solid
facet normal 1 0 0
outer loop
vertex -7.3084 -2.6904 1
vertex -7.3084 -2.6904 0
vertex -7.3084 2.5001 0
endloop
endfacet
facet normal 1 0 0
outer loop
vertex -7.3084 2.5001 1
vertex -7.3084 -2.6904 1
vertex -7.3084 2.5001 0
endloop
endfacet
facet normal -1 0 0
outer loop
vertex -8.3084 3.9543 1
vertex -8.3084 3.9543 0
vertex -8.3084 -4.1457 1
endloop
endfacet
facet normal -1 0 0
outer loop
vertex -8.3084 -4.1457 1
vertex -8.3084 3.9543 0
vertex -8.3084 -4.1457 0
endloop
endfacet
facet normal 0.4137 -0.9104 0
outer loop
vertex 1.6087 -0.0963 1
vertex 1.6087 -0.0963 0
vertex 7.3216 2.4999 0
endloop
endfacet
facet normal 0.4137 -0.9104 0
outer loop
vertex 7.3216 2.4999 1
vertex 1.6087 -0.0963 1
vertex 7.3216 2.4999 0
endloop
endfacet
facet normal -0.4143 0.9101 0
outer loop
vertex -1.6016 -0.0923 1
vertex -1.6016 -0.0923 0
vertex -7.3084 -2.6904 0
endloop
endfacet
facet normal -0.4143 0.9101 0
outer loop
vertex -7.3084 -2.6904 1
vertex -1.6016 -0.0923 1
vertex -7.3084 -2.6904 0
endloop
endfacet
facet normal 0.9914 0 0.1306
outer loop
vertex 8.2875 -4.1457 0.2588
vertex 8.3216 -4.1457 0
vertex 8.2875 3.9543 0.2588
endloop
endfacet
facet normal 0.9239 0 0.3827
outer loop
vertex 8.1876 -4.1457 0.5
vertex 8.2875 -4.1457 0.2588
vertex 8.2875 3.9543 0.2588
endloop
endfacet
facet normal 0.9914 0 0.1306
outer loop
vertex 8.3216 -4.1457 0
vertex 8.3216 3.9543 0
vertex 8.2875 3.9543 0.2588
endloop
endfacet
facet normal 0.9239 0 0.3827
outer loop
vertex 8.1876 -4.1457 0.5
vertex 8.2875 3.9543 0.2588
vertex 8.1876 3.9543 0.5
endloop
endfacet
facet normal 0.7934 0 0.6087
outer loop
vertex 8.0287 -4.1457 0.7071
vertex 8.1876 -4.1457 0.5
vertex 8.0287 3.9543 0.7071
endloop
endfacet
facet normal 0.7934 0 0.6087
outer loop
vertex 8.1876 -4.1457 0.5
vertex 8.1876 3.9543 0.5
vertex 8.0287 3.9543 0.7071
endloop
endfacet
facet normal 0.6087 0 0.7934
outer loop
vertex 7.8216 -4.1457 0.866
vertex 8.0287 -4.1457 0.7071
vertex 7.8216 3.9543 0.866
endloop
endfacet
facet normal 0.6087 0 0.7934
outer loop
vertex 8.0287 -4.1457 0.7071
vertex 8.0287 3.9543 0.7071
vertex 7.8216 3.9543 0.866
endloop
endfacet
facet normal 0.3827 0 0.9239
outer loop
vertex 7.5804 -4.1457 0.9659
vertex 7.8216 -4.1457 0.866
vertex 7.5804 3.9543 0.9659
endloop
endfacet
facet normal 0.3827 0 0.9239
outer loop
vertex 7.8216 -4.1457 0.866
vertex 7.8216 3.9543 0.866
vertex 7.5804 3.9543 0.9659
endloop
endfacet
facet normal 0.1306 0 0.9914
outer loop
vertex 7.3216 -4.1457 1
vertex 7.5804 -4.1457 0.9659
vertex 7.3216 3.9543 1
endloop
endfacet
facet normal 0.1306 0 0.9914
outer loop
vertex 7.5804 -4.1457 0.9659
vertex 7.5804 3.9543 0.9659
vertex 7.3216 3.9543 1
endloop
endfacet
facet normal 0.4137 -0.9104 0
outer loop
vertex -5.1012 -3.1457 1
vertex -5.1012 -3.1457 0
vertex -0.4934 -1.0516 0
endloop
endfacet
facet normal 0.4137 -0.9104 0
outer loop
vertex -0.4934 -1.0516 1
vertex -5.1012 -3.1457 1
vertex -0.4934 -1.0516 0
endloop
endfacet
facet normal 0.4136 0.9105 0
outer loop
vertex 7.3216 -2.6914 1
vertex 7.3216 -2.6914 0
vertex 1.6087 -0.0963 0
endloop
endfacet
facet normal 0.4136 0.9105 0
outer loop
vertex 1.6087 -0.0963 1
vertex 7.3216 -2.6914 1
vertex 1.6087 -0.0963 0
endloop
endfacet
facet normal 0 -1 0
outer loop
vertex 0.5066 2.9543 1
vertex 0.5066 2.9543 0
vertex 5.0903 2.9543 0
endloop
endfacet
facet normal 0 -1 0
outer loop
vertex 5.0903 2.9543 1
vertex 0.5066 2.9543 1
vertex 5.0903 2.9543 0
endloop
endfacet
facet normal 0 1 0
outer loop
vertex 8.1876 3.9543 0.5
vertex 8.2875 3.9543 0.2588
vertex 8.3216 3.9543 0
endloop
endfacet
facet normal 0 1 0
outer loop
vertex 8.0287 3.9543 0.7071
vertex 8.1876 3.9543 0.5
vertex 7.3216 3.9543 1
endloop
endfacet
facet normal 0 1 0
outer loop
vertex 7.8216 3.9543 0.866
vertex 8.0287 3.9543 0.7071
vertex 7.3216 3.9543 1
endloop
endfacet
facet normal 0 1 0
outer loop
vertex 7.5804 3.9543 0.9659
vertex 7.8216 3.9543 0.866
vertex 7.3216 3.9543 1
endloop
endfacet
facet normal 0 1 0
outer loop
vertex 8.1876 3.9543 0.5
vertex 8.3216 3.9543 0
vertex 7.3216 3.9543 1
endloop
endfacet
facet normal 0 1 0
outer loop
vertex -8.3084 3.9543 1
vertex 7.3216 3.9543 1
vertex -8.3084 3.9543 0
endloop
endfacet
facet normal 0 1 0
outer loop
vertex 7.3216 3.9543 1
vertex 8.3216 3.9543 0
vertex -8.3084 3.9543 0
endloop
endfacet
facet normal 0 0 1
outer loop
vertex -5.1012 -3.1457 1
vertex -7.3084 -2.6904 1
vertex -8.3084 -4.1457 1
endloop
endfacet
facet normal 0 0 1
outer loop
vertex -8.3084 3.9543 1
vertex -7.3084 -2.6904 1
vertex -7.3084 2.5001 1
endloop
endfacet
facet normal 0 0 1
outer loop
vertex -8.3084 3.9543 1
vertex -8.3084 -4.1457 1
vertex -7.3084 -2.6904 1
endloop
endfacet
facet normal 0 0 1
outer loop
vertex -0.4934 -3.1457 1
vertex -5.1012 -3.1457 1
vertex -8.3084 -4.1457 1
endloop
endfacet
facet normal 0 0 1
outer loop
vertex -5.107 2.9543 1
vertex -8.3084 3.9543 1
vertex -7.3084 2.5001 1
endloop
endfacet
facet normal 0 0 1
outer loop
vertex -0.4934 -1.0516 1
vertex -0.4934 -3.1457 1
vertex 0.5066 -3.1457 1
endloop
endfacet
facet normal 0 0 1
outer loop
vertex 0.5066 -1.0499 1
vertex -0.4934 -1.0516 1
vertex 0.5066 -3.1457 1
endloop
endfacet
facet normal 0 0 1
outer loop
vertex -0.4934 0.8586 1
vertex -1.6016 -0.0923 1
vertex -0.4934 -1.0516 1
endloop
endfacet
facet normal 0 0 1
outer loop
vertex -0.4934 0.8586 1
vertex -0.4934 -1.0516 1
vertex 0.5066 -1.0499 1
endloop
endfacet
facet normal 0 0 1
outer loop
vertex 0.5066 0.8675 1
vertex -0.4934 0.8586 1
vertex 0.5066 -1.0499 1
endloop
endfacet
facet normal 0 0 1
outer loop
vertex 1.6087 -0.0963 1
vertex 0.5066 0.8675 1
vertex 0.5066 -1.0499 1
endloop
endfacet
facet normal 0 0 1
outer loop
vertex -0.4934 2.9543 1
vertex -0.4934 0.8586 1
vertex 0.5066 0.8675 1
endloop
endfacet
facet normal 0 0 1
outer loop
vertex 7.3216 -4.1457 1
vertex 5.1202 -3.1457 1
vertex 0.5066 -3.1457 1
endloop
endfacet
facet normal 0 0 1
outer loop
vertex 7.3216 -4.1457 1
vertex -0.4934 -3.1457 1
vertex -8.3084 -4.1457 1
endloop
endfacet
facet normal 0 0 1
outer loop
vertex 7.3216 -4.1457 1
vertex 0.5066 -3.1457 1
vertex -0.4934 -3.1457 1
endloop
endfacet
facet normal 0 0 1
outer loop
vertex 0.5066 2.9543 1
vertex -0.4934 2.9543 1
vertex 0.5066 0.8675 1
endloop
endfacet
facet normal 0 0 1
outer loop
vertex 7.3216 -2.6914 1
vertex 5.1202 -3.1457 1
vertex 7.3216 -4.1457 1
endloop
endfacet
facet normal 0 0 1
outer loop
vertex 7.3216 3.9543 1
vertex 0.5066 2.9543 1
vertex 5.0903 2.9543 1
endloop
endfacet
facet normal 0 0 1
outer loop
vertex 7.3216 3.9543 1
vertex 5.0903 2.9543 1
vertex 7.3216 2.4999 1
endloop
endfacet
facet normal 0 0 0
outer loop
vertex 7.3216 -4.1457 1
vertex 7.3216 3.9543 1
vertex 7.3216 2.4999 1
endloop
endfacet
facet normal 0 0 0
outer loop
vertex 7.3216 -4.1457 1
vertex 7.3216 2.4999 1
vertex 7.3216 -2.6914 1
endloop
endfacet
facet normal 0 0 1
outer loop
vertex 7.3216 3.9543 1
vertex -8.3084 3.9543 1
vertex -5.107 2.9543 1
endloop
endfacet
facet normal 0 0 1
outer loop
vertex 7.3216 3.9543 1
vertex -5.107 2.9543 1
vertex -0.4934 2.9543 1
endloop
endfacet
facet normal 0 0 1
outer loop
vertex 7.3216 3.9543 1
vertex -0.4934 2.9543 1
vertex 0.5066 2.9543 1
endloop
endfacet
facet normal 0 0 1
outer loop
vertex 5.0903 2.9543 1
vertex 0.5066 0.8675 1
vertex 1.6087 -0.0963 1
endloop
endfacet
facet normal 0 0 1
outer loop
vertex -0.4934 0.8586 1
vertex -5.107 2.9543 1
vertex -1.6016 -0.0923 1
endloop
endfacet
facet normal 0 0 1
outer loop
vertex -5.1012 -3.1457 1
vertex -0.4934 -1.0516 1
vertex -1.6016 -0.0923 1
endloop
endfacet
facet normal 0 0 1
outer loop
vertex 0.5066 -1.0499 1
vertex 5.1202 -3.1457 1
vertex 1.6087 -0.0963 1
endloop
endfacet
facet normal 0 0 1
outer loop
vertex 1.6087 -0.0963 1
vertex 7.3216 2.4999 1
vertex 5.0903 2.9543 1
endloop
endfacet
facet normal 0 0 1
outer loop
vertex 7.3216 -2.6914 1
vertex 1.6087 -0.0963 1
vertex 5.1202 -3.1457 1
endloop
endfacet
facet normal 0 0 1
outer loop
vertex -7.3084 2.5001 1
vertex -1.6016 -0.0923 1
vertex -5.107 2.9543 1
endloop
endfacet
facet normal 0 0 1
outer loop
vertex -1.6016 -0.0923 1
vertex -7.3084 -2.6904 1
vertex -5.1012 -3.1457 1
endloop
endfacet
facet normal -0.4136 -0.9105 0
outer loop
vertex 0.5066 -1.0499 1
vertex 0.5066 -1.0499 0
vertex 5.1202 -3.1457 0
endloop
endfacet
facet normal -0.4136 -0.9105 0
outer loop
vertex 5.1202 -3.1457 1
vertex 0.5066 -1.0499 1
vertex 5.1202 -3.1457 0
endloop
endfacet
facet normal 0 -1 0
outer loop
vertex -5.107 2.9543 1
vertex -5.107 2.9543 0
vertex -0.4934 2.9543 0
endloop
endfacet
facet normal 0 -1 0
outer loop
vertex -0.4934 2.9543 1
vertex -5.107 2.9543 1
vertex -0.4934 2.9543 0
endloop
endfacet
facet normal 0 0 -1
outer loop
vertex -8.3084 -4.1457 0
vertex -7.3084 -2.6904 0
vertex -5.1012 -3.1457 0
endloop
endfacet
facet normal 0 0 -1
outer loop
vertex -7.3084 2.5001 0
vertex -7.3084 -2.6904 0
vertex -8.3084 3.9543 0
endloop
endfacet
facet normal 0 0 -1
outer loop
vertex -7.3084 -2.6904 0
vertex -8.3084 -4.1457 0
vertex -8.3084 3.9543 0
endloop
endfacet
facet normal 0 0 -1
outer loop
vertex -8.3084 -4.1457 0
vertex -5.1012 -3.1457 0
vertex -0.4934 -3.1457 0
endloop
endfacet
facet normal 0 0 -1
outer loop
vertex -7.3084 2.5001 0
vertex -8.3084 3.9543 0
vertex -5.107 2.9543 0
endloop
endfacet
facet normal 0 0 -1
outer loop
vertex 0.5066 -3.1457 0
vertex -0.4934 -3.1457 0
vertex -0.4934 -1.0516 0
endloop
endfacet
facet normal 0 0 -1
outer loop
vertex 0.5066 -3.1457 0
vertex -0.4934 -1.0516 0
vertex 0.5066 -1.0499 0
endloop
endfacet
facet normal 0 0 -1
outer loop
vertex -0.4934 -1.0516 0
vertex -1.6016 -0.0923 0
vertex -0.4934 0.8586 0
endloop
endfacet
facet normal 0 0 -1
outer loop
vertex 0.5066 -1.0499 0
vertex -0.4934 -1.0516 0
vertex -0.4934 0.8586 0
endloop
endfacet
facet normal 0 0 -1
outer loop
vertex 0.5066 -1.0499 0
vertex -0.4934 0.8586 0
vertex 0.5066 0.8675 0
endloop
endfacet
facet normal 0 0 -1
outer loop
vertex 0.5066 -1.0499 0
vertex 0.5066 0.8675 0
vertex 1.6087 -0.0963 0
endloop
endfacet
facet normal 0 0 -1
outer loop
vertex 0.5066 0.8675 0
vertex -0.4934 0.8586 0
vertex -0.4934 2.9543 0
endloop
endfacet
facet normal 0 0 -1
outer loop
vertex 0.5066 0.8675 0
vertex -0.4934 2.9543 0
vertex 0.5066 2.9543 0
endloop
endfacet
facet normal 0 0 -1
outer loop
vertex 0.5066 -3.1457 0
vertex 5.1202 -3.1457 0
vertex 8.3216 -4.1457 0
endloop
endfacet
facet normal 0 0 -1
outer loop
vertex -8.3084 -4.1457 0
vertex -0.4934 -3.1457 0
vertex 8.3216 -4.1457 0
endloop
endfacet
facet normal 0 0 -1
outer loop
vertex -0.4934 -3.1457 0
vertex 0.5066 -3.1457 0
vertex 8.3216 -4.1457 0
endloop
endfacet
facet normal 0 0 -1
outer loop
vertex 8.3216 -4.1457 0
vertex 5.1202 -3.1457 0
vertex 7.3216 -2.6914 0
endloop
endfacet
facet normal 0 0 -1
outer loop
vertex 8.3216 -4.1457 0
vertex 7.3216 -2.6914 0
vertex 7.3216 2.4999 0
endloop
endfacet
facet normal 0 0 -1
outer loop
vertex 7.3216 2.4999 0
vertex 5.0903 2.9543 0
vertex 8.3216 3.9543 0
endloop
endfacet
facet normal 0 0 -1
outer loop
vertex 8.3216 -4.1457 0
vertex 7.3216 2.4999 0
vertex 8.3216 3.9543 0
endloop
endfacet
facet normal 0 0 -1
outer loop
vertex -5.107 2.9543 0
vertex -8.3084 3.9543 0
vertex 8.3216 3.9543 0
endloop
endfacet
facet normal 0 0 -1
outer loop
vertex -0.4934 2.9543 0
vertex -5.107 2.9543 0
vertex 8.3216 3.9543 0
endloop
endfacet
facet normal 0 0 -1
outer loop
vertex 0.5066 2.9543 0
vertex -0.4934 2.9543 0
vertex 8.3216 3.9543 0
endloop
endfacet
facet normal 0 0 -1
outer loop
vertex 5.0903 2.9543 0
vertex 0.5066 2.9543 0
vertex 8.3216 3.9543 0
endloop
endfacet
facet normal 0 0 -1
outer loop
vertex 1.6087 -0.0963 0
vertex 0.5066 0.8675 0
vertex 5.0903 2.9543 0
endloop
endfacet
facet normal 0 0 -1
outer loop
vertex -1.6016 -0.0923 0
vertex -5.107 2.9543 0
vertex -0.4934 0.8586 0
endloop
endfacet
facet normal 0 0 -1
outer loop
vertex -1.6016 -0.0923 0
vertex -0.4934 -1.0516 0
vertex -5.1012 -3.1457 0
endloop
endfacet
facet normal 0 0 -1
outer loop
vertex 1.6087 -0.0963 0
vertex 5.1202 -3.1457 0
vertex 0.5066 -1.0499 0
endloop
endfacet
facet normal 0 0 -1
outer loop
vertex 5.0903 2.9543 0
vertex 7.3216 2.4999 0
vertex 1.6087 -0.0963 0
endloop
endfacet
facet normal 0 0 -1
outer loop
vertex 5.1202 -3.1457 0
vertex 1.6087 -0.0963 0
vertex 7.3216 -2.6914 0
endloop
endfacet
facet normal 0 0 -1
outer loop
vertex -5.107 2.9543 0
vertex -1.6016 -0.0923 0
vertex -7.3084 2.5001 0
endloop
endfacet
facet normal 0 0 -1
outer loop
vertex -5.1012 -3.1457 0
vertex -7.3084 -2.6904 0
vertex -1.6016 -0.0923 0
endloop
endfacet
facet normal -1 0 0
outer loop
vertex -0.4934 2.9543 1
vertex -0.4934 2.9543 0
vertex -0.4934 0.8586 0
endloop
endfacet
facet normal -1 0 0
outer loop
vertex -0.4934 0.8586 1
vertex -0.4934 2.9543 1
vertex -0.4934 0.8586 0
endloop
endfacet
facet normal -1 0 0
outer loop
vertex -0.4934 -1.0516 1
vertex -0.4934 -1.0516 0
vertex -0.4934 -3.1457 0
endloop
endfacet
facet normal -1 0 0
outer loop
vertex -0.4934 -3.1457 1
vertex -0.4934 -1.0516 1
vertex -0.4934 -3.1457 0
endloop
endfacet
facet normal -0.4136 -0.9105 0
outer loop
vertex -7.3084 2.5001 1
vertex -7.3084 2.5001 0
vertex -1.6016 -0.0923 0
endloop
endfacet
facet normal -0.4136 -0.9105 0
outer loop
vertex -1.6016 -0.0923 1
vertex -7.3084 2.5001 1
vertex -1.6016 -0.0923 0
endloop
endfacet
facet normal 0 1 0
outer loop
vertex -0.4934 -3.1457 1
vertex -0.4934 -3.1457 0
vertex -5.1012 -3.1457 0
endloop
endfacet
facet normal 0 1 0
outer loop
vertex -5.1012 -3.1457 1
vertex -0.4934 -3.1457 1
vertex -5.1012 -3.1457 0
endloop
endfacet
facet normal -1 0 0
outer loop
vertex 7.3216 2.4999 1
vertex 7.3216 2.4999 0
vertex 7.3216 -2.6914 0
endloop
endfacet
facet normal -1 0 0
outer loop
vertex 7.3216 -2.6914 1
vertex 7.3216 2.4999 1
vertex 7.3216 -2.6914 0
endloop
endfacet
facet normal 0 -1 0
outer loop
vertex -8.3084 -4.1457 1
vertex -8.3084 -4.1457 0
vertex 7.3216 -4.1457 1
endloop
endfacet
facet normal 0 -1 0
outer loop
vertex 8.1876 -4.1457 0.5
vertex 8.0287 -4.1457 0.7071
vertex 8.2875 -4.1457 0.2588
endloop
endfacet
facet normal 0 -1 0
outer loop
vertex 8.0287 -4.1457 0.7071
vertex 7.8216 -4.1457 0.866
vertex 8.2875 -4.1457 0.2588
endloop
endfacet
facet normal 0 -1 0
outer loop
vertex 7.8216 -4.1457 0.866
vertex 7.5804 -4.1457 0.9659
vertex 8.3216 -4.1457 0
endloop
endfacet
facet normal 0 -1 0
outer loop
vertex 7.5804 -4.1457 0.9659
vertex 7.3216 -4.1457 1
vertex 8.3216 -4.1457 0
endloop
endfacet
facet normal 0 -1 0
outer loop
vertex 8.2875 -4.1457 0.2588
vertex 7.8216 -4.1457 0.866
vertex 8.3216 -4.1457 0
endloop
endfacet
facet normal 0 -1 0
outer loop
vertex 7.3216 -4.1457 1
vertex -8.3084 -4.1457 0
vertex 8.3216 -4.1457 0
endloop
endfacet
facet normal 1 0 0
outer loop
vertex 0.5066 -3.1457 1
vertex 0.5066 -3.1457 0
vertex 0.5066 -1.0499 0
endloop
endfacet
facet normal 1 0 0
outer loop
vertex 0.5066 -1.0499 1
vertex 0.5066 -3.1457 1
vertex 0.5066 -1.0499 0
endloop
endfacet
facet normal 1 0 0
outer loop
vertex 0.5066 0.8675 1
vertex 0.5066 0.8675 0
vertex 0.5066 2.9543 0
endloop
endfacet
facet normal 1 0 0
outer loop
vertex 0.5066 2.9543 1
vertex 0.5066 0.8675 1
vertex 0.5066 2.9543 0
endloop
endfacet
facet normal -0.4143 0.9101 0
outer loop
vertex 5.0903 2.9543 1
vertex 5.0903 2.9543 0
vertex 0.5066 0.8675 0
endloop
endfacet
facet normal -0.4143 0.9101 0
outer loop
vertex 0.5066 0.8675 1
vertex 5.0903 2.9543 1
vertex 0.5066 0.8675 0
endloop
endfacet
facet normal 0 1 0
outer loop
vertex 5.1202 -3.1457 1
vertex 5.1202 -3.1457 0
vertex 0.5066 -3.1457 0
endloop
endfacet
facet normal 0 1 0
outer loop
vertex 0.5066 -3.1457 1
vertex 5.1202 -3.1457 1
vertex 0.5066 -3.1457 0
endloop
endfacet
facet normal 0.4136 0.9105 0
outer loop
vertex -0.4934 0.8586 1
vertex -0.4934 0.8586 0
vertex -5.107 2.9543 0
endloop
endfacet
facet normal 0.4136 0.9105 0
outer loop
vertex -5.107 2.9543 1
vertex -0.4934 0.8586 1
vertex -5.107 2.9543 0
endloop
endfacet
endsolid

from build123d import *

# Parameters (mm, degrees)
F1_DEPTH = 1
F2_R     = 0.99999


# Not quite as in the source:
# - a fillet or chamfer is up to 0.001 mm smaller than in the source, because OpenCascade refuses the exact size


with BuildPart() as f1:
    # F0 (on Top) → F1 (new body)
    with BuildSketch(Plane.XY):
        Polygon((-7.3084038651, 2.5000789639), (-8.3084038651, 2.9543336025), (-8.3084038651, -3.1456663975), (-7.3084038651, -2.6904001687), align=None)
        Polygon((-7.3084038651, 2.9543336025), (-8.3084038651, 2.9543336025), (-7.3084038651, 2.5000789639), align=None)
        Polygon((-7.3084038651, 3.9543336025), (-8.3084038651, 3.9543336025), (-8.3084038651, 2.9543336025), (-7.3084038651, 2.9543336025), (-5.1069954144, 2.9543336025), align=None)
        Polygon((-7.3084038651, -2.6904001687), (-8.3084038651, -3.1456663975), (-7.3084038651, -3.1456663975), align=None)
        Polygon((-7.3084038651, -3.1456663975), (-8.3084038651, -3.1456663975), (-8.3084038651, -4.1456663975), (-7.3017124087, -4.1456663975), (-5.1012464166, -3.1456663975), align=None)
        Polygon((-0.4934038651, -3.1456663975), (-5.1012464166, -3.1456663975), (-7.3017124087, -4.1456663975), (7.3215961349, -4.1456663975), (5.1201876842, -3.1456663975), (0.5065961349, -3.1456663975), align=None)
        Polygon((-7.3084038651, -2.6904001687), (-7.3084038651, -3.1456663975), (-5.1012464166, -3.1456663975), (-0.4934038651, -1.0516360566), (-0.4934038651, -0.5956663975), (-1.6015758867, -0.0922741165), align=None)
        Polygon((-0.0026520019, 0.6356619308), (-0.4934038651, 0.4122391807), (-0.4934038651, -0.5956663975), (0.0083764092, -0.8236024146), (0.5065961349, -0.597186861), (0.5065961349, 0.4043336025), align=None)
        Polygon((0.0083764092, -0.8236024146), (-0.4934038651, -0.5956663975), (-0.4934038651, -1.0516360566), align=None)
        Polygon((0.5065961349, -0.597186861), (0.0083764092, -0.8236024146), (0.5065961349, -1.0499210361), align=None)
        Polygon((1.6087379174, -0.0963194146), (0.5065961349, 0.4043336025), (0.5065961349, -0.597186861), align=None)
        Polygon((-0.0026520019, 0.6356619308), (-0.4934038651, 0.858588241), (-0.4934038651, 0.4122391807), align=None)
        Polygon((0.5065961349, 0.4043336025), (0.5065961349, 0.8675054096), (-0.0026520019, 0.6356619308), align=None)
        Polygon((0.5065961349, 2.9543336025), (-0.4934038651, 2.9543336025), (-0.4934038651, 0.858588241), (-0.0026520019, 0.6356619308), (0.5065961349, 0.8675054096), align=None)
        Polygon((-0.4934038651, -1.0516360566), (-0.4934038651, -3.1456663975), (0.5065961349, -3.1456663975), (0.5065961349, -1.0499210361), (0.0083764092, -0.8236024146), align=None)
        Polygon((7.3215961349, 2.9543336025), (5.0903496856, 2.9543336025), (0.5065961349, 0.8675054096), (0.5065961349, 0.4043336025), (1.6087379174, -0.0963194146), (7.3215961349, 2.4998844069), align=None)
        Polygon((8.3215961349, 3.9543336025), (7.2868666612, 3.9543336025), (5.0903496856, 2.9543336025), (7.3215961349, 2.9543336025), (8.3215961349, 2.9543336025), align=None)
        Polygon((7.3215961349, 2.4998844069), (8.3215961349, 2.9543336025), (7.3215961349, 2.9543336025), align=None)
        Polygon((8.3215961349, -3.1456663975), (8.3215961349, 2.9543336025), (7.3215961349, 2.4998844069), (7.3215961349, -2.691411759), align=None)
        Polygon((7.3215961349, -3.1456663975), (8.3215961349, -3.1456663975), (7.3215961349, -2.691411759), align=None)
        Polygon((8.3215961349, -4.1456663975), (8.3215961349, -3.1456663975), (7.3215961349, -3.1456663975), (5.1201876842, -3.1456663975), (7.3215961349, -4.1456663975), align=None)
        Polygon((-0.4934038651, 0.858588241), (-5.1069954144, 2.9543336025), (-7.3084038651, 2.9543336025), (-7.3084038651, 2.5000789639), (-1.6015758867, -0.0922741165), (-0.4934038651, 0.4122391807), align=None)
        Polygon((-0.4934038651, 0.4122391807), (-1.6015758867, -0.0922741165), (-0.4934038651, -0.5956663975), align=None)
        Polygon((5.1201876842, -3.1456663975), (7.3215961349, -3.1456663975), (7.3215961349, -2.691411759), (1.6087379174, -0.0963194146), (0.5065961349, -0.597186861), (0.5065961349, -1.0499210361), align=None)
        Polygon((7.2868666612, 3.9543336025), (-7.3084038651, 3.9543336025), (-5.1069954144, 2.9543336025), (-0.4934038651, 2.9543336025), (0.5065961349, 2.9543336025), (5.0903496856, 2.9543336025), align=None)
    extrude(amount=F1_DEPTH)

    # F2 (radius 1 in the source; OpenCascade refuses exactly that, so slightly less here)
    f2_edges = [f1.edges().sort_by_distance(p)[0] for p in [
        (8.321596, -0.095666, 1),
    ]]
    fillet(f2_edges, radius=F2_R)


solid = f1.part
